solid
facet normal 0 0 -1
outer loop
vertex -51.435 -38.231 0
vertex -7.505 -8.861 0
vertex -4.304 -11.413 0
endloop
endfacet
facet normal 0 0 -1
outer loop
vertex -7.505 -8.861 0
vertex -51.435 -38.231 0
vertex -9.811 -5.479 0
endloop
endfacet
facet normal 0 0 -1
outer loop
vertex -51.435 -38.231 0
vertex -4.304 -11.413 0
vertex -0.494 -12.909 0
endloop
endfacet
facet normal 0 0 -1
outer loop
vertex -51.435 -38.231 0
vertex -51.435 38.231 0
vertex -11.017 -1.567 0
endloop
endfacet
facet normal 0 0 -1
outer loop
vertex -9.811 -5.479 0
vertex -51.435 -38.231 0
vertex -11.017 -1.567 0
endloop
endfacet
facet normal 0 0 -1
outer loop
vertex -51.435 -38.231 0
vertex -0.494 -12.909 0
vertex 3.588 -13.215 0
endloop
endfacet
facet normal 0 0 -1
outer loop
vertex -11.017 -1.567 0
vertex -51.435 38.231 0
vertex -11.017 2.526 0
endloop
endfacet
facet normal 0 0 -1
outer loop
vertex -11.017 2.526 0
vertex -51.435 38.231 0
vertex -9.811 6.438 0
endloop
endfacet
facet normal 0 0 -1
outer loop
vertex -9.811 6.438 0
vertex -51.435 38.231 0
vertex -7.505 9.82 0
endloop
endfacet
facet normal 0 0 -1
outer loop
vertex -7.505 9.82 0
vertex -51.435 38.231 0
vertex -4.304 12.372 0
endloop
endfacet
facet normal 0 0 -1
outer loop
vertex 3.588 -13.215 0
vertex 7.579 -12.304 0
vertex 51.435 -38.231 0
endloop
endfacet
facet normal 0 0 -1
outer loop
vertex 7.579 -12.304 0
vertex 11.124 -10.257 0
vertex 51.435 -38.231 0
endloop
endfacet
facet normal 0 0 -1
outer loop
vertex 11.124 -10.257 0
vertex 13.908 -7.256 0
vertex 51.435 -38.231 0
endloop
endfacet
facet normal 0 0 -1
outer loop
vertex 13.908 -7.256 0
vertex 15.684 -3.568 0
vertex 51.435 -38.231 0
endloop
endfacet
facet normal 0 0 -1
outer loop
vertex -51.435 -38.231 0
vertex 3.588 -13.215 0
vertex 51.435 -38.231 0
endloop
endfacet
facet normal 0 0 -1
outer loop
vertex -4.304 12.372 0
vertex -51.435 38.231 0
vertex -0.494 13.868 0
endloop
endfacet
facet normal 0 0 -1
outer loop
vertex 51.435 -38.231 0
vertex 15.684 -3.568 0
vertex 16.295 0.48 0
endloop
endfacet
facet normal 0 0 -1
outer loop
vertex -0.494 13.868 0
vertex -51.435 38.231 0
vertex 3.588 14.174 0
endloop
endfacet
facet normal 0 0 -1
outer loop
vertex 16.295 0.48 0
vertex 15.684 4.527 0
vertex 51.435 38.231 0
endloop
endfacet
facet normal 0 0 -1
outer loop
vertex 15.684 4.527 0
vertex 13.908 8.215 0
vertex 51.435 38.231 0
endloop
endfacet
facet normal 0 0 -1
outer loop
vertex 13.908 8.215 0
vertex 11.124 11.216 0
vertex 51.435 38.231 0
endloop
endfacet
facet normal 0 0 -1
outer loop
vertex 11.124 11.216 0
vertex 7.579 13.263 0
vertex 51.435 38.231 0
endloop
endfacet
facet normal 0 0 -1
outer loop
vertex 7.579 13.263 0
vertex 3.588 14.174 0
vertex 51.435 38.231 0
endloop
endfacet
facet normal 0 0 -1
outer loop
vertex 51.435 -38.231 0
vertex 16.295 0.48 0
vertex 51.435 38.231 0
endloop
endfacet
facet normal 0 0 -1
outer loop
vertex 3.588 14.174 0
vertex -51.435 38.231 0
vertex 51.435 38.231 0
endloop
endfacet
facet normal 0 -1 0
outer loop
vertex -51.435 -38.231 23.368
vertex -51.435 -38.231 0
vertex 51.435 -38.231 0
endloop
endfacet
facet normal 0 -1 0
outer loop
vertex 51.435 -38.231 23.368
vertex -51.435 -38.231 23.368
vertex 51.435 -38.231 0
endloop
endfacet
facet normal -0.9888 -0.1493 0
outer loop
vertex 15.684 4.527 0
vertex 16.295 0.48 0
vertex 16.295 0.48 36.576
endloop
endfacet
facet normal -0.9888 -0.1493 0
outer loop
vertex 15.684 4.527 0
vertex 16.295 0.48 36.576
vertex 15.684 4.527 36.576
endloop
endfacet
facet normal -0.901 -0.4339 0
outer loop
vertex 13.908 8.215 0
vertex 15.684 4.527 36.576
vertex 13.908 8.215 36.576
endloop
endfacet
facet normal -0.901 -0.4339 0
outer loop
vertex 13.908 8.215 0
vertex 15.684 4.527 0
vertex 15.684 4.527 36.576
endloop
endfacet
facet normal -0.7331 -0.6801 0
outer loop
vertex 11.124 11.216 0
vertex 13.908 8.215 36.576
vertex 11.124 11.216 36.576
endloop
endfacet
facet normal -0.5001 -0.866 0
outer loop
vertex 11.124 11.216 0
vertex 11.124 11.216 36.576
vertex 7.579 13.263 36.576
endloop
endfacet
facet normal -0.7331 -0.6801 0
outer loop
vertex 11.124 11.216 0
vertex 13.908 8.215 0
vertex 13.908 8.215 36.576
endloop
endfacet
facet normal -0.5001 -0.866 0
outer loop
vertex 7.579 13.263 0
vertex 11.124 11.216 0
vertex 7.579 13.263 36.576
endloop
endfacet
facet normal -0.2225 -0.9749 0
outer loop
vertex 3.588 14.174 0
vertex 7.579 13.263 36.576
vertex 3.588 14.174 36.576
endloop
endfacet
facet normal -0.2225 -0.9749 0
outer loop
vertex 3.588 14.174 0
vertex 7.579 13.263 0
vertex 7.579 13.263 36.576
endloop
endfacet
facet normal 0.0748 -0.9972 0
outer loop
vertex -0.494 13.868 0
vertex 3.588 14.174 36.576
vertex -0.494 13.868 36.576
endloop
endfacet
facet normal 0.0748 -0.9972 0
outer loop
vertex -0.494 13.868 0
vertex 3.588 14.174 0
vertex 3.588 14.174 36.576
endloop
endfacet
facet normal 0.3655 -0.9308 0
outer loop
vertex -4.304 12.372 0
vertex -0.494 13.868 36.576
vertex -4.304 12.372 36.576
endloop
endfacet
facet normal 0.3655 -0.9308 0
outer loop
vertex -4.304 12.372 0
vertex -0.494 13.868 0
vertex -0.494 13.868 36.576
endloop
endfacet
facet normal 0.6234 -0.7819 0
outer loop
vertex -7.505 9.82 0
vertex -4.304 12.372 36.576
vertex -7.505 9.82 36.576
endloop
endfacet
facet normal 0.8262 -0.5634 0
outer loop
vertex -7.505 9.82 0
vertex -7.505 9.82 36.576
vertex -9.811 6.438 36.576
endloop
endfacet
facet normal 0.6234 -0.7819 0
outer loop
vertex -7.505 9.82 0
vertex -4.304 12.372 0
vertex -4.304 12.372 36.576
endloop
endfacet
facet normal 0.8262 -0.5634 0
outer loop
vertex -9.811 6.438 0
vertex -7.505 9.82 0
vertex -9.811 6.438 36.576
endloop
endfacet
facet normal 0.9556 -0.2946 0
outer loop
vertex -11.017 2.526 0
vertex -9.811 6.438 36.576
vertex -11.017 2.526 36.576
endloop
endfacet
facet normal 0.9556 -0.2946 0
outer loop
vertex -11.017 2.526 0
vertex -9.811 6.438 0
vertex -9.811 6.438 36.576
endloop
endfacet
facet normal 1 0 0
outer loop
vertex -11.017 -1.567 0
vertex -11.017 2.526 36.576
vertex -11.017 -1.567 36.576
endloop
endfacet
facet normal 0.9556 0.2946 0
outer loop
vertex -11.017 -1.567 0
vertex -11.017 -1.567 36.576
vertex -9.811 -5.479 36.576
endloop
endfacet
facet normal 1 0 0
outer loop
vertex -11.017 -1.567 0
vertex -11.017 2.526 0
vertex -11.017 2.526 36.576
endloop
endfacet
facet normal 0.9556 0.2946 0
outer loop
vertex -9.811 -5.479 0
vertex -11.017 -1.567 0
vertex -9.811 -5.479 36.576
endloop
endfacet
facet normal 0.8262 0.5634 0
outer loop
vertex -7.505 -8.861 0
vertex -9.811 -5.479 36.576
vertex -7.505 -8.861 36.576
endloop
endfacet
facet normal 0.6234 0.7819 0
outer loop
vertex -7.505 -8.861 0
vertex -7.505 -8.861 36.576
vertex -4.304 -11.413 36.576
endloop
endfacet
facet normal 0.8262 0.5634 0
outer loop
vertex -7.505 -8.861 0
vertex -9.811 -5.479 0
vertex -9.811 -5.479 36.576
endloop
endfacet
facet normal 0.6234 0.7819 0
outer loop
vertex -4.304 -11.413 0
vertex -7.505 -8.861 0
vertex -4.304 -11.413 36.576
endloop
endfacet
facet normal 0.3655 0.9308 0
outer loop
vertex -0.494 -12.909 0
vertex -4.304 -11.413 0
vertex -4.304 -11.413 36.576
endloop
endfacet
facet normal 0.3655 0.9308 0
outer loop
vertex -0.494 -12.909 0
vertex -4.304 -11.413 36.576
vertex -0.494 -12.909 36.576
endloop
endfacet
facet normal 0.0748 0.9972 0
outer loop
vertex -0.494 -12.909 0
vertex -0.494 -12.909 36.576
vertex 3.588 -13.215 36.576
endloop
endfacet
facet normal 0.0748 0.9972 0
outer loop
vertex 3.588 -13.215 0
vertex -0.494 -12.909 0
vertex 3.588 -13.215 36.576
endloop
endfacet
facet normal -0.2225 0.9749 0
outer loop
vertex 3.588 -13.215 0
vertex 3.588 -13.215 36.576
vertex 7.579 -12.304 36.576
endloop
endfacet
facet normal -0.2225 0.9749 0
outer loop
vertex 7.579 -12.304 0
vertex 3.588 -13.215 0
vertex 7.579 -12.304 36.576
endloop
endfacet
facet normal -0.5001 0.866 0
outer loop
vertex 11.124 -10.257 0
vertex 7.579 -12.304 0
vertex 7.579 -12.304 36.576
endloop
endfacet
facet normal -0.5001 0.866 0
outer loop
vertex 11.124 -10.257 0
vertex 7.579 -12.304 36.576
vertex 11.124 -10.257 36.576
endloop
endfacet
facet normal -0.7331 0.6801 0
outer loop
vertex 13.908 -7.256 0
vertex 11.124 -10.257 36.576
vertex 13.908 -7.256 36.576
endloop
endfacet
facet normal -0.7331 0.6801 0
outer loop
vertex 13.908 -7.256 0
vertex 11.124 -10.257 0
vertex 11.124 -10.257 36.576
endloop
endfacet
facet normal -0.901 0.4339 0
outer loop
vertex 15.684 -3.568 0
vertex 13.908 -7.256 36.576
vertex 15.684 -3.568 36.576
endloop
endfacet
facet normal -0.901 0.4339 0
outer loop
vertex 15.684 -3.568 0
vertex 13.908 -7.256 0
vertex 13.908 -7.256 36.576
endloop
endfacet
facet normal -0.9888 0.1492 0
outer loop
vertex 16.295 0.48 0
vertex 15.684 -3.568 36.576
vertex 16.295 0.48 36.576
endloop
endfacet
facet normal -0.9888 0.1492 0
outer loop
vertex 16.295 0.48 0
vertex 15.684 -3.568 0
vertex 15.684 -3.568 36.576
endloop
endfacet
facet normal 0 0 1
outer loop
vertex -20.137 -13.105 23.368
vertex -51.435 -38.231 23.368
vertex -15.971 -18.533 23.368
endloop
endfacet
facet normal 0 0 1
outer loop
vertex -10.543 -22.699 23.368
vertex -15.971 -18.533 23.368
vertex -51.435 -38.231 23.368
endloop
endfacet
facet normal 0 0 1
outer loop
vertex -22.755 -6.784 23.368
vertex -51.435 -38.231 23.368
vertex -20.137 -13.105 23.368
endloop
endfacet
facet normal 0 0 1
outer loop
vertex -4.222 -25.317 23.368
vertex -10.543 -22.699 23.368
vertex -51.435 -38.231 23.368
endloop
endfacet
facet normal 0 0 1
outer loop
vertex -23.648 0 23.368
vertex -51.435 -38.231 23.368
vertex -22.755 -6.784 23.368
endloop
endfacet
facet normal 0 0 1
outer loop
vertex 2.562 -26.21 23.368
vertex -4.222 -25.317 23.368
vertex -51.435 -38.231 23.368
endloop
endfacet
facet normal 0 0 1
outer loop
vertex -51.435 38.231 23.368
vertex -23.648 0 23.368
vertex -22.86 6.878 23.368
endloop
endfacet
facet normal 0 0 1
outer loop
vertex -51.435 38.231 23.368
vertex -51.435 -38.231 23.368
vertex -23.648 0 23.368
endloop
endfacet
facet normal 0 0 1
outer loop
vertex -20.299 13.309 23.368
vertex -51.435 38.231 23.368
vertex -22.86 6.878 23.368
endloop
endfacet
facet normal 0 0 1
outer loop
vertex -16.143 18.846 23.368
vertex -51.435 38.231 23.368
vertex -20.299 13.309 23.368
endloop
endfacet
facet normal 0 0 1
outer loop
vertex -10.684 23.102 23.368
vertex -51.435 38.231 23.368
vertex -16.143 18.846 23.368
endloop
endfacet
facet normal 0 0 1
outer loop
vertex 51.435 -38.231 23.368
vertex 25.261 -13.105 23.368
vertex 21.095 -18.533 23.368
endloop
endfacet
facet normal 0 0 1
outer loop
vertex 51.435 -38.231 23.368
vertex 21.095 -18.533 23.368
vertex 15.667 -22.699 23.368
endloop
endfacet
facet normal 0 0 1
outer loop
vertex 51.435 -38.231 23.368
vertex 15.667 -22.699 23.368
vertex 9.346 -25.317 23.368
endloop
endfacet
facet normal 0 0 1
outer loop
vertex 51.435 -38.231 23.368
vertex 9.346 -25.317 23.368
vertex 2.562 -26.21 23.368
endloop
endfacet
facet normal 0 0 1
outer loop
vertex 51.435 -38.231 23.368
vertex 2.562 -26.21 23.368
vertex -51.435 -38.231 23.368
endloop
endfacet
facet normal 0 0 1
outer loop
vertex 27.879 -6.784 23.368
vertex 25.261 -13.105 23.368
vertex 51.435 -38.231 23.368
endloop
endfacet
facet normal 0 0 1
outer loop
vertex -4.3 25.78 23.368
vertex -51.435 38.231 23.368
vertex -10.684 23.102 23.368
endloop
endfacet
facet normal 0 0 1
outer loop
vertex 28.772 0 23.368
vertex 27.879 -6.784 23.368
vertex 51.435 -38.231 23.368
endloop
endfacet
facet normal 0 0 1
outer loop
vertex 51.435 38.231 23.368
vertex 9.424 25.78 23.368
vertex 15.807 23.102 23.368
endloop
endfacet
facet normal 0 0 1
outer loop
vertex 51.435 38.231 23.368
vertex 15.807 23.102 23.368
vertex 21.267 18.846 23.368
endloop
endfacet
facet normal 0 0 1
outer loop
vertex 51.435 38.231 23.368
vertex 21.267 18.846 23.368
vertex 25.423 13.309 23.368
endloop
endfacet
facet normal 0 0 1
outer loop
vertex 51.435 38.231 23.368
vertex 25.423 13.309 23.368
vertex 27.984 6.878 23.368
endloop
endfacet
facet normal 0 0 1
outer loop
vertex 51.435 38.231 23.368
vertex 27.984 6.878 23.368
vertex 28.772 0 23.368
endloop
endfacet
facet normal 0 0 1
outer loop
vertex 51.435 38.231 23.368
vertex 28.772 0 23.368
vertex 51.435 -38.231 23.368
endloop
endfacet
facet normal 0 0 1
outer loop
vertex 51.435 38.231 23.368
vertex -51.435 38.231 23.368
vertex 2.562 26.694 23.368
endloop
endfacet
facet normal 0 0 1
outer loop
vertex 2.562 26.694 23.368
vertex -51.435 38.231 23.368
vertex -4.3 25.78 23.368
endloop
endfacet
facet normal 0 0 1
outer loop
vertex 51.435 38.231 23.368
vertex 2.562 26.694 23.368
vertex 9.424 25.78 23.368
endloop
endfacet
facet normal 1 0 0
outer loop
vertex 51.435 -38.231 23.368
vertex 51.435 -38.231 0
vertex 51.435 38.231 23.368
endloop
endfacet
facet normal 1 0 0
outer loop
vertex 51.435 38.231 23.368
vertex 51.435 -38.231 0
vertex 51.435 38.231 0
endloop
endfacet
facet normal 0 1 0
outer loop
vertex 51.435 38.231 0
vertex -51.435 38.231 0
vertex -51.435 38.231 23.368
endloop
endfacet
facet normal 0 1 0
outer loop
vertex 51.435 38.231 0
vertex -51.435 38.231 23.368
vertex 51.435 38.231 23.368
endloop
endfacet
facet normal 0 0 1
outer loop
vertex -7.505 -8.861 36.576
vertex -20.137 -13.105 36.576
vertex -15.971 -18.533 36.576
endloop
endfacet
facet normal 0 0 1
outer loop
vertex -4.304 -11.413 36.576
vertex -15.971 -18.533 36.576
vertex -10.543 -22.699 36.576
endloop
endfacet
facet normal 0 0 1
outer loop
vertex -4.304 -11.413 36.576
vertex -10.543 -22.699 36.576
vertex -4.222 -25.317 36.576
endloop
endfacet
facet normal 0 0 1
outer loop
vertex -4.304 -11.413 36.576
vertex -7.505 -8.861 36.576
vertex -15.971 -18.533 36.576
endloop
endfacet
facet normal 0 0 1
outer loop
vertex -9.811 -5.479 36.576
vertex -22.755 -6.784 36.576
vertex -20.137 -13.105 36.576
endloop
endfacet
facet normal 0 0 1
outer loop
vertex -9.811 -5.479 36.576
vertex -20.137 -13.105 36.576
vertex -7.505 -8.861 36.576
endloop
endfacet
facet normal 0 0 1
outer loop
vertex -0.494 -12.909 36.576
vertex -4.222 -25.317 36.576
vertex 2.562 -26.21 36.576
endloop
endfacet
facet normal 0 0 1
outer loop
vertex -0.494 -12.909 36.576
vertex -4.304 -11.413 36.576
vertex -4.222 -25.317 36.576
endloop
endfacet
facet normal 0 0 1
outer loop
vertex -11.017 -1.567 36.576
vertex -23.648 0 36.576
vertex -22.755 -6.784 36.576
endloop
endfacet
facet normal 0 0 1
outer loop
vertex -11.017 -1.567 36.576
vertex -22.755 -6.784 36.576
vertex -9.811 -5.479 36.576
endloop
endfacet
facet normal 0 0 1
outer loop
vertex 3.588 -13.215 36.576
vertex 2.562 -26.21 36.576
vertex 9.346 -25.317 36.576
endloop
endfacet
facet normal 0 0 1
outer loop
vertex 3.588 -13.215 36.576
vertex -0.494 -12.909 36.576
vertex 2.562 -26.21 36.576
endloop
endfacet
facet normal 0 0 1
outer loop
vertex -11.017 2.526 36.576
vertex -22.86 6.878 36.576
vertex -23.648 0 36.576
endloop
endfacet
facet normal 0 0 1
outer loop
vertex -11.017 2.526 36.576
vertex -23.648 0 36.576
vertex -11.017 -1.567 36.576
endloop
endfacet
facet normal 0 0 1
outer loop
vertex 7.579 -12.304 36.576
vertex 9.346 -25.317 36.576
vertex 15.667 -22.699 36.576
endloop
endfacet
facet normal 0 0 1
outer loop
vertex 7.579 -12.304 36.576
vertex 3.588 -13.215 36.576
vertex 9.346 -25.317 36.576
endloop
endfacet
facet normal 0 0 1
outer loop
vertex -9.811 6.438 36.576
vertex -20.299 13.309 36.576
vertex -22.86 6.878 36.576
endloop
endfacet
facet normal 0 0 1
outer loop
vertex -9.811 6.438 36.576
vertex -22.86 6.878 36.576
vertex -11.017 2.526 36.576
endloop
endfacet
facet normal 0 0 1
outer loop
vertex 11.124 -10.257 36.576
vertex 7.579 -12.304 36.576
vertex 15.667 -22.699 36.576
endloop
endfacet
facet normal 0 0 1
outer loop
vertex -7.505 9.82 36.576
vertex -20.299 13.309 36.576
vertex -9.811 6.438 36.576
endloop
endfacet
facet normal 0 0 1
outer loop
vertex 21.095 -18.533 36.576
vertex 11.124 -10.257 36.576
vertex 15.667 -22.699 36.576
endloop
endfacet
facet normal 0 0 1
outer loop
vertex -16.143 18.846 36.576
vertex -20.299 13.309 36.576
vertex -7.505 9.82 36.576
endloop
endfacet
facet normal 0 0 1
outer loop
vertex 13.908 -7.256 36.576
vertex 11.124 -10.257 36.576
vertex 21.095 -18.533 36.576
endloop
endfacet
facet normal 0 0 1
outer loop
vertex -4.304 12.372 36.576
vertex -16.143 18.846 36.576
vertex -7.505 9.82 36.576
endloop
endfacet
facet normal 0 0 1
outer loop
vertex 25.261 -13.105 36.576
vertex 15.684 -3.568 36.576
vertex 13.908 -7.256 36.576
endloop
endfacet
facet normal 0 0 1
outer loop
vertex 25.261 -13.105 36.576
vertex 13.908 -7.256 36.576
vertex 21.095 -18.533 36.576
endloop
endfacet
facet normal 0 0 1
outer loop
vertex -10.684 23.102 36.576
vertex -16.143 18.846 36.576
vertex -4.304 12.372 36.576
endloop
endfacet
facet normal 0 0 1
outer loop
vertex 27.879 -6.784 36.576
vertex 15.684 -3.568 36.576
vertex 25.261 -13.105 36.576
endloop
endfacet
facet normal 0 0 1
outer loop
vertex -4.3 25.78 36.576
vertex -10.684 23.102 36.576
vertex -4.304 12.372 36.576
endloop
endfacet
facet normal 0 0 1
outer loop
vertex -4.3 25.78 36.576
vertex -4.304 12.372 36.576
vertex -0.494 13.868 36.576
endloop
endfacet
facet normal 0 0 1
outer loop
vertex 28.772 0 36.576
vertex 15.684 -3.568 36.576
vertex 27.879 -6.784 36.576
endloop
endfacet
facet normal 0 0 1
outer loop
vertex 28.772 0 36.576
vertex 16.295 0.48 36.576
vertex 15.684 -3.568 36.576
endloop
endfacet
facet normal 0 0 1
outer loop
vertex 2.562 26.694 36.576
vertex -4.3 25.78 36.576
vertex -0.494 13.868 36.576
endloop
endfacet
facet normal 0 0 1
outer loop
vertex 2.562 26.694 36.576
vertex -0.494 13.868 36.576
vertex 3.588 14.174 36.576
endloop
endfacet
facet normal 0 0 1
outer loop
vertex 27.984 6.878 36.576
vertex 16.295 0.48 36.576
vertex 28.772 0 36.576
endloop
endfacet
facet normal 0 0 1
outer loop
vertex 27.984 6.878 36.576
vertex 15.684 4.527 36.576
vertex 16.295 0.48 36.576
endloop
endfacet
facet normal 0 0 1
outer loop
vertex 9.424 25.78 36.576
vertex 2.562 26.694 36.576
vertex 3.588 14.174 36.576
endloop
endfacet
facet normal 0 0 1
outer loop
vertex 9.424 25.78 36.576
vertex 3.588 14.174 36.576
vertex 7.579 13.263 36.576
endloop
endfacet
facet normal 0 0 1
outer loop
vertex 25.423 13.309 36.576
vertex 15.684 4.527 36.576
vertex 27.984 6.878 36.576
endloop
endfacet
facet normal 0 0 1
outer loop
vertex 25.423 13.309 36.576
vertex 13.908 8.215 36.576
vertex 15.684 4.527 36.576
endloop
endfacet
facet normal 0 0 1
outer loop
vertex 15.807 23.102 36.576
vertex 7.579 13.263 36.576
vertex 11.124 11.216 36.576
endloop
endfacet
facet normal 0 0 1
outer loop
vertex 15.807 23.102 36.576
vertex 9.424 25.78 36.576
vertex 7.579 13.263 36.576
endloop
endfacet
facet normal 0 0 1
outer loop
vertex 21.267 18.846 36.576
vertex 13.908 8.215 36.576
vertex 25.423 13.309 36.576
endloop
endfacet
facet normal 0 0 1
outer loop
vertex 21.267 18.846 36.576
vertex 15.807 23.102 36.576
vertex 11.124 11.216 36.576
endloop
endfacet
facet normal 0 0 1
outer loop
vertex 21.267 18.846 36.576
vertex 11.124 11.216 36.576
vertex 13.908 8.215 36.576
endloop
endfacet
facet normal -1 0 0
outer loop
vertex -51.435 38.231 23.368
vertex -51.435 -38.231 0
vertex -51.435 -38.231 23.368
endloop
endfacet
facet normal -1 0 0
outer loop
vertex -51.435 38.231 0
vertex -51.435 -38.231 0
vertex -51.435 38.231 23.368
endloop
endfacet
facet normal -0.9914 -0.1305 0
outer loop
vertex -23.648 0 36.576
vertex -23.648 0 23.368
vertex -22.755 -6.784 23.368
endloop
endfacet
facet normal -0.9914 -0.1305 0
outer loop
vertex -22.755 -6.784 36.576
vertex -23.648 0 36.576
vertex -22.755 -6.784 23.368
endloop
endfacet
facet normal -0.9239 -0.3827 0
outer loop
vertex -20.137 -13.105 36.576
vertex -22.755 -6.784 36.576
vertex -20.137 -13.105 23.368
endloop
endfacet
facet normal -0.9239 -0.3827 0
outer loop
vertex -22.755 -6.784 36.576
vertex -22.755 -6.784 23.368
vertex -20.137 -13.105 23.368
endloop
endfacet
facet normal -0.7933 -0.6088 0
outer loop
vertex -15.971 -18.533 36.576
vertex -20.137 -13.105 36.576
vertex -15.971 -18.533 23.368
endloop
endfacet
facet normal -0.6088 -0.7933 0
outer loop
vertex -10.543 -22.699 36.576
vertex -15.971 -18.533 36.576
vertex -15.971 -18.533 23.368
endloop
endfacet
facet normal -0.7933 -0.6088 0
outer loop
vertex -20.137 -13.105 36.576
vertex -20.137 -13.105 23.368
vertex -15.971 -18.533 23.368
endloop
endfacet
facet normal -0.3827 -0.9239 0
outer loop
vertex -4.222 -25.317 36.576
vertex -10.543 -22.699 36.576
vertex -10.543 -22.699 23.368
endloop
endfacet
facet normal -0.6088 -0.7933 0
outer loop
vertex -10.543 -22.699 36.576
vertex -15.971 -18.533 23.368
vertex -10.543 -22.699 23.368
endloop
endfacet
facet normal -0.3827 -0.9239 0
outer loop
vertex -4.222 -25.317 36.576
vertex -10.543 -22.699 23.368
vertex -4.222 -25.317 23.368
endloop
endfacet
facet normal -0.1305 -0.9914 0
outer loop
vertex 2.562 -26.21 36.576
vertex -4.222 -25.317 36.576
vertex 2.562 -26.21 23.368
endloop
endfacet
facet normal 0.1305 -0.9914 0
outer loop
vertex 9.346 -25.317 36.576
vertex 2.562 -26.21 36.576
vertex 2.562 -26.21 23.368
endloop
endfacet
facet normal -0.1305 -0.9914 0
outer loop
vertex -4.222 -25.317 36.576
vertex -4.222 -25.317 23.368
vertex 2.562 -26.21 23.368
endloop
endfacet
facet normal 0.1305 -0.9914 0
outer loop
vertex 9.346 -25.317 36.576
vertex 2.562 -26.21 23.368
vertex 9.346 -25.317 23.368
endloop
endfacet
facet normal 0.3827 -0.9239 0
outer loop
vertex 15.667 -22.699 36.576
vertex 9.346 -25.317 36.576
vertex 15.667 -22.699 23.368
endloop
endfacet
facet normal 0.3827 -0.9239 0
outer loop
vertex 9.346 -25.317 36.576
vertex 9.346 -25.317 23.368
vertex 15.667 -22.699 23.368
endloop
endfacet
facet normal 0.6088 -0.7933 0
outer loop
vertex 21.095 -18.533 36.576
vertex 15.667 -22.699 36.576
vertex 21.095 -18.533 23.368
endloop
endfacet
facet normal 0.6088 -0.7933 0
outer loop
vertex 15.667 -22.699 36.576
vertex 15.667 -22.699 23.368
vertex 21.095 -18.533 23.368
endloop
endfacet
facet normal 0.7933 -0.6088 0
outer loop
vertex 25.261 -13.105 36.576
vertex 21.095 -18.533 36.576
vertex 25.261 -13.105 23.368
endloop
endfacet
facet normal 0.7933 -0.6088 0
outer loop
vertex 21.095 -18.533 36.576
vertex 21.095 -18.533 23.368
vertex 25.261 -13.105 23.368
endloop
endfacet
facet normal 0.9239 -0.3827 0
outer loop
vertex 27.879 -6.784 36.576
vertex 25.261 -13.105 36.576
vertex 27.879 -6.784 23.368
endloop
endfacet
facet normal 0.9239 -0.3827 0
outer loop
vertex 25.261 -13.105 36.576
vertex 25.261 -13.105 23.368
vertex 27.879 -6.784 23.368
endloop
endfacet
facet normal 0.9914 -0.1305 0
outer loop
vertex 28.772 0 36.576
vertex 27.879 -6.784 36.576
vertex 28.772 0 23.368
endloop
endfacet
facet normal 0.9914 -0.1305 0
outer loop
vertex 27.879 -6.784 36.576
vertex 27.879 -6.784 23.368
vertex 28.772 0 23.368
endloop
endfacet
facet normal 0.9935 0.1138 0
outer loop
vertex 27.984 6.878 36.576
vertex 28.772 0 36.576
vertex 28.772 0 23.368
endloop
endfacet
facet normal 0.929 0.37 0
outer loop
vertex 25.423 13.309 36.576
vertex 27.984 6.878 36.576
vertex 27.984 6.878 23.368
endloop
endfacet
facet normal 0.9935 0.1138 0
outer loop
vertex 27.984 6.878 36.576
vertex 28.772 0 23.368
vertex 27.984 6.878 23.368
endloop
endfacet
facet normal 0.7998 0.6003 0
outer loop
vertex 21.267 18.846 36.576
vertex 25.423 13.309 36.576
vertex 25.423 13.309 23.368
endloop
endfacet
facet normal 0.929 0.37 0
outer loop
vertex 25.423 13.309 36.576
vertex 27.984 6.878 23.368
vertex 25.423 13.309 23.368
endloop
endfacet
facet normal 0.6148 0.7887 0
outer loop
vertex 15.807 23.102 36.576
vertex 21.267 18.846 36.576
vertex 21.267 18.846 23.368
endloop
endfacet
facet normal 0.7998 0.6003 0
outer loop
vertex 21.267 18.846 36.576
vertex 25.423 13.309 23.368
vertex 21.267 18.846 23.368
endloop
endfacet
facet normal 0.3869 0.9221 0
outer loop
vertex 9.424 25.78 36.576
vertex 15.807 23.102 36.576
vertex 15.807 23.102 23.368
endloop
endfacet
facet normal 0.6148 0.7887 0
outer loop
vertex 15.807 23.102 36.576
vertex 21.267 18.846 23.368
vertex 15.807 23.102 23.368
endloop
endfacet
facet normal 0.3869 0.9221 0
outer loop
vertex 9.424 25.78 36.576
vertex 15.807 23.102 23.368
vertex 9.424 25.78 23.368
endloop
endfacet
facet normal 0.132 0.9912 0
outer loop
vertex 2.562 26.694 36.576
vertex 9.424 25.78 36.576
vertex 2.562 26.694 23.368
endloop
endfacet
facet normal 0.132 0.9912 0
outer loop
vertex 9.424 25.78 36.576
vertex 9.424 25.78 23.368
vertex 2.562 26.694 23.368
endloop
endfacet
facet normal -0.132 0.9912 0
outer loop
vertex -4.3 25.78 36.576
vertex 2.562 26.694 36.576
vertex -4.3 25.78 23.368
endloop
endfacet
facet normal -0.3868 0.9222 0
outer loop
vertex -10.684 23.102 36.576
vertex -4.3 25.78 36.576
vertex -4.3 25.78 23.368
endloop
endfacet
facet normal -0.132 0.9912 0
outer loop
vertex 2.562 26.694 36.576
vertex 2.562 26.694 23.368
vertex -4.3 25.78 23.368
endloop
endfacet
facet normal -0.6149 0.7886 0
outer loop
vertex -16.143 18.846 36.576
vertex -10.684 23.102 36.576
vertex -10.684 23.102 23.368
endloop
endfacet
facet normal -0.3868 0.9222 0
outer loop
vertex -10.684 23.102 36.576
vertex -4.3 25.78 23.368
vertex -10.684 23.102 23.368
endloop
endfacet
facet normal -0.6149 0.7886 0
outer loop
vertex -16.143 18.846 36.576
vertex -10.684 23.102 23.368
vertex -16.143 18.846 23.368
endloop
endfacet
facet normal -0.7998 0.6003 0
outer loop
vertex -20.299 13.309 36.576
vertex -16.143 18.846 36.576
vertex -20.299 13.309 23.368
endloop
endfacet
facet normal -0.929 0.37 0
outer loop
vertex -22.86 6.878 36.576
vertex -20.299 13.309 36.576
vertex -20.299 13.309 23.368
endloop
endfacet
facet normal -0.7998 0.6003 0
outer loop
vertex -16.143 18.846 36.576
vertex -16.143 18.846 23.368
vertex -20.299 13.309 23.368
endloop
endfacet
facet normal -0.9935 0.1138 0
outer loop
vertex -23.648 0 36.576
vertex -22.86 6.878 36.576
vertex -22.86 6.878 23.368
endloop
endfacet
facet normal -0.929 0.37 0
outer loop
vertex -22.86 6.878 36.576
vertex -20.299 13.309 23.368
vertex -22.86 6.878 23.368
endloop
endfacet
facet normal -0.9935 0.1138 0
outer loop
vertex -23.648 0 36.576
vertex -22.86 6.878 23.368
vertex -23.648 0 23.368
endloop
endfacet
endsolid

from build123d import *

# Parameters (mm, degrees)
F0_R     = 13.732641
F1_DEPTH = 36.576
F0_W     = 102.870002
F0_H     = 76.46276
F2_DEPTH = 23.368


with BuildPart() as f1:
    # F0 (on Top) → F1 (new body)
    with BuildSketch(Plane.XY):
        with BuildLine():
            ThreePointArc((28.772071, 0), (2.561897, 26.694094), (-23.648277, 0))
            ThreePointArc((-23.648277, 0), (2.561897, -26.210174), (28.772071, 0))
        make_face()
        with Locations((2.561897, 0.479534)):
            Circle(F0_R, mode=Mode.SUBTRACT)
    extrude(amount=F1_DEPTH)

    # F0 (on Top) → F2 (join)
    with BuildSketch(Plane.XY):
        Rectangle(F0_W, F0_H)
        with BuildLine():
            ThreePointArc((28.772071, 0), (2.561897, -26.210174), (-23.648277, 0))
            ThreePointArc((-23.648277, 0), (2.561897, 26.694094), (28.772071, 0))
        make_face(mode=Mode.SUBTRACT)
    extrude(amount=F2_DEPTH)


solid = f1.part
